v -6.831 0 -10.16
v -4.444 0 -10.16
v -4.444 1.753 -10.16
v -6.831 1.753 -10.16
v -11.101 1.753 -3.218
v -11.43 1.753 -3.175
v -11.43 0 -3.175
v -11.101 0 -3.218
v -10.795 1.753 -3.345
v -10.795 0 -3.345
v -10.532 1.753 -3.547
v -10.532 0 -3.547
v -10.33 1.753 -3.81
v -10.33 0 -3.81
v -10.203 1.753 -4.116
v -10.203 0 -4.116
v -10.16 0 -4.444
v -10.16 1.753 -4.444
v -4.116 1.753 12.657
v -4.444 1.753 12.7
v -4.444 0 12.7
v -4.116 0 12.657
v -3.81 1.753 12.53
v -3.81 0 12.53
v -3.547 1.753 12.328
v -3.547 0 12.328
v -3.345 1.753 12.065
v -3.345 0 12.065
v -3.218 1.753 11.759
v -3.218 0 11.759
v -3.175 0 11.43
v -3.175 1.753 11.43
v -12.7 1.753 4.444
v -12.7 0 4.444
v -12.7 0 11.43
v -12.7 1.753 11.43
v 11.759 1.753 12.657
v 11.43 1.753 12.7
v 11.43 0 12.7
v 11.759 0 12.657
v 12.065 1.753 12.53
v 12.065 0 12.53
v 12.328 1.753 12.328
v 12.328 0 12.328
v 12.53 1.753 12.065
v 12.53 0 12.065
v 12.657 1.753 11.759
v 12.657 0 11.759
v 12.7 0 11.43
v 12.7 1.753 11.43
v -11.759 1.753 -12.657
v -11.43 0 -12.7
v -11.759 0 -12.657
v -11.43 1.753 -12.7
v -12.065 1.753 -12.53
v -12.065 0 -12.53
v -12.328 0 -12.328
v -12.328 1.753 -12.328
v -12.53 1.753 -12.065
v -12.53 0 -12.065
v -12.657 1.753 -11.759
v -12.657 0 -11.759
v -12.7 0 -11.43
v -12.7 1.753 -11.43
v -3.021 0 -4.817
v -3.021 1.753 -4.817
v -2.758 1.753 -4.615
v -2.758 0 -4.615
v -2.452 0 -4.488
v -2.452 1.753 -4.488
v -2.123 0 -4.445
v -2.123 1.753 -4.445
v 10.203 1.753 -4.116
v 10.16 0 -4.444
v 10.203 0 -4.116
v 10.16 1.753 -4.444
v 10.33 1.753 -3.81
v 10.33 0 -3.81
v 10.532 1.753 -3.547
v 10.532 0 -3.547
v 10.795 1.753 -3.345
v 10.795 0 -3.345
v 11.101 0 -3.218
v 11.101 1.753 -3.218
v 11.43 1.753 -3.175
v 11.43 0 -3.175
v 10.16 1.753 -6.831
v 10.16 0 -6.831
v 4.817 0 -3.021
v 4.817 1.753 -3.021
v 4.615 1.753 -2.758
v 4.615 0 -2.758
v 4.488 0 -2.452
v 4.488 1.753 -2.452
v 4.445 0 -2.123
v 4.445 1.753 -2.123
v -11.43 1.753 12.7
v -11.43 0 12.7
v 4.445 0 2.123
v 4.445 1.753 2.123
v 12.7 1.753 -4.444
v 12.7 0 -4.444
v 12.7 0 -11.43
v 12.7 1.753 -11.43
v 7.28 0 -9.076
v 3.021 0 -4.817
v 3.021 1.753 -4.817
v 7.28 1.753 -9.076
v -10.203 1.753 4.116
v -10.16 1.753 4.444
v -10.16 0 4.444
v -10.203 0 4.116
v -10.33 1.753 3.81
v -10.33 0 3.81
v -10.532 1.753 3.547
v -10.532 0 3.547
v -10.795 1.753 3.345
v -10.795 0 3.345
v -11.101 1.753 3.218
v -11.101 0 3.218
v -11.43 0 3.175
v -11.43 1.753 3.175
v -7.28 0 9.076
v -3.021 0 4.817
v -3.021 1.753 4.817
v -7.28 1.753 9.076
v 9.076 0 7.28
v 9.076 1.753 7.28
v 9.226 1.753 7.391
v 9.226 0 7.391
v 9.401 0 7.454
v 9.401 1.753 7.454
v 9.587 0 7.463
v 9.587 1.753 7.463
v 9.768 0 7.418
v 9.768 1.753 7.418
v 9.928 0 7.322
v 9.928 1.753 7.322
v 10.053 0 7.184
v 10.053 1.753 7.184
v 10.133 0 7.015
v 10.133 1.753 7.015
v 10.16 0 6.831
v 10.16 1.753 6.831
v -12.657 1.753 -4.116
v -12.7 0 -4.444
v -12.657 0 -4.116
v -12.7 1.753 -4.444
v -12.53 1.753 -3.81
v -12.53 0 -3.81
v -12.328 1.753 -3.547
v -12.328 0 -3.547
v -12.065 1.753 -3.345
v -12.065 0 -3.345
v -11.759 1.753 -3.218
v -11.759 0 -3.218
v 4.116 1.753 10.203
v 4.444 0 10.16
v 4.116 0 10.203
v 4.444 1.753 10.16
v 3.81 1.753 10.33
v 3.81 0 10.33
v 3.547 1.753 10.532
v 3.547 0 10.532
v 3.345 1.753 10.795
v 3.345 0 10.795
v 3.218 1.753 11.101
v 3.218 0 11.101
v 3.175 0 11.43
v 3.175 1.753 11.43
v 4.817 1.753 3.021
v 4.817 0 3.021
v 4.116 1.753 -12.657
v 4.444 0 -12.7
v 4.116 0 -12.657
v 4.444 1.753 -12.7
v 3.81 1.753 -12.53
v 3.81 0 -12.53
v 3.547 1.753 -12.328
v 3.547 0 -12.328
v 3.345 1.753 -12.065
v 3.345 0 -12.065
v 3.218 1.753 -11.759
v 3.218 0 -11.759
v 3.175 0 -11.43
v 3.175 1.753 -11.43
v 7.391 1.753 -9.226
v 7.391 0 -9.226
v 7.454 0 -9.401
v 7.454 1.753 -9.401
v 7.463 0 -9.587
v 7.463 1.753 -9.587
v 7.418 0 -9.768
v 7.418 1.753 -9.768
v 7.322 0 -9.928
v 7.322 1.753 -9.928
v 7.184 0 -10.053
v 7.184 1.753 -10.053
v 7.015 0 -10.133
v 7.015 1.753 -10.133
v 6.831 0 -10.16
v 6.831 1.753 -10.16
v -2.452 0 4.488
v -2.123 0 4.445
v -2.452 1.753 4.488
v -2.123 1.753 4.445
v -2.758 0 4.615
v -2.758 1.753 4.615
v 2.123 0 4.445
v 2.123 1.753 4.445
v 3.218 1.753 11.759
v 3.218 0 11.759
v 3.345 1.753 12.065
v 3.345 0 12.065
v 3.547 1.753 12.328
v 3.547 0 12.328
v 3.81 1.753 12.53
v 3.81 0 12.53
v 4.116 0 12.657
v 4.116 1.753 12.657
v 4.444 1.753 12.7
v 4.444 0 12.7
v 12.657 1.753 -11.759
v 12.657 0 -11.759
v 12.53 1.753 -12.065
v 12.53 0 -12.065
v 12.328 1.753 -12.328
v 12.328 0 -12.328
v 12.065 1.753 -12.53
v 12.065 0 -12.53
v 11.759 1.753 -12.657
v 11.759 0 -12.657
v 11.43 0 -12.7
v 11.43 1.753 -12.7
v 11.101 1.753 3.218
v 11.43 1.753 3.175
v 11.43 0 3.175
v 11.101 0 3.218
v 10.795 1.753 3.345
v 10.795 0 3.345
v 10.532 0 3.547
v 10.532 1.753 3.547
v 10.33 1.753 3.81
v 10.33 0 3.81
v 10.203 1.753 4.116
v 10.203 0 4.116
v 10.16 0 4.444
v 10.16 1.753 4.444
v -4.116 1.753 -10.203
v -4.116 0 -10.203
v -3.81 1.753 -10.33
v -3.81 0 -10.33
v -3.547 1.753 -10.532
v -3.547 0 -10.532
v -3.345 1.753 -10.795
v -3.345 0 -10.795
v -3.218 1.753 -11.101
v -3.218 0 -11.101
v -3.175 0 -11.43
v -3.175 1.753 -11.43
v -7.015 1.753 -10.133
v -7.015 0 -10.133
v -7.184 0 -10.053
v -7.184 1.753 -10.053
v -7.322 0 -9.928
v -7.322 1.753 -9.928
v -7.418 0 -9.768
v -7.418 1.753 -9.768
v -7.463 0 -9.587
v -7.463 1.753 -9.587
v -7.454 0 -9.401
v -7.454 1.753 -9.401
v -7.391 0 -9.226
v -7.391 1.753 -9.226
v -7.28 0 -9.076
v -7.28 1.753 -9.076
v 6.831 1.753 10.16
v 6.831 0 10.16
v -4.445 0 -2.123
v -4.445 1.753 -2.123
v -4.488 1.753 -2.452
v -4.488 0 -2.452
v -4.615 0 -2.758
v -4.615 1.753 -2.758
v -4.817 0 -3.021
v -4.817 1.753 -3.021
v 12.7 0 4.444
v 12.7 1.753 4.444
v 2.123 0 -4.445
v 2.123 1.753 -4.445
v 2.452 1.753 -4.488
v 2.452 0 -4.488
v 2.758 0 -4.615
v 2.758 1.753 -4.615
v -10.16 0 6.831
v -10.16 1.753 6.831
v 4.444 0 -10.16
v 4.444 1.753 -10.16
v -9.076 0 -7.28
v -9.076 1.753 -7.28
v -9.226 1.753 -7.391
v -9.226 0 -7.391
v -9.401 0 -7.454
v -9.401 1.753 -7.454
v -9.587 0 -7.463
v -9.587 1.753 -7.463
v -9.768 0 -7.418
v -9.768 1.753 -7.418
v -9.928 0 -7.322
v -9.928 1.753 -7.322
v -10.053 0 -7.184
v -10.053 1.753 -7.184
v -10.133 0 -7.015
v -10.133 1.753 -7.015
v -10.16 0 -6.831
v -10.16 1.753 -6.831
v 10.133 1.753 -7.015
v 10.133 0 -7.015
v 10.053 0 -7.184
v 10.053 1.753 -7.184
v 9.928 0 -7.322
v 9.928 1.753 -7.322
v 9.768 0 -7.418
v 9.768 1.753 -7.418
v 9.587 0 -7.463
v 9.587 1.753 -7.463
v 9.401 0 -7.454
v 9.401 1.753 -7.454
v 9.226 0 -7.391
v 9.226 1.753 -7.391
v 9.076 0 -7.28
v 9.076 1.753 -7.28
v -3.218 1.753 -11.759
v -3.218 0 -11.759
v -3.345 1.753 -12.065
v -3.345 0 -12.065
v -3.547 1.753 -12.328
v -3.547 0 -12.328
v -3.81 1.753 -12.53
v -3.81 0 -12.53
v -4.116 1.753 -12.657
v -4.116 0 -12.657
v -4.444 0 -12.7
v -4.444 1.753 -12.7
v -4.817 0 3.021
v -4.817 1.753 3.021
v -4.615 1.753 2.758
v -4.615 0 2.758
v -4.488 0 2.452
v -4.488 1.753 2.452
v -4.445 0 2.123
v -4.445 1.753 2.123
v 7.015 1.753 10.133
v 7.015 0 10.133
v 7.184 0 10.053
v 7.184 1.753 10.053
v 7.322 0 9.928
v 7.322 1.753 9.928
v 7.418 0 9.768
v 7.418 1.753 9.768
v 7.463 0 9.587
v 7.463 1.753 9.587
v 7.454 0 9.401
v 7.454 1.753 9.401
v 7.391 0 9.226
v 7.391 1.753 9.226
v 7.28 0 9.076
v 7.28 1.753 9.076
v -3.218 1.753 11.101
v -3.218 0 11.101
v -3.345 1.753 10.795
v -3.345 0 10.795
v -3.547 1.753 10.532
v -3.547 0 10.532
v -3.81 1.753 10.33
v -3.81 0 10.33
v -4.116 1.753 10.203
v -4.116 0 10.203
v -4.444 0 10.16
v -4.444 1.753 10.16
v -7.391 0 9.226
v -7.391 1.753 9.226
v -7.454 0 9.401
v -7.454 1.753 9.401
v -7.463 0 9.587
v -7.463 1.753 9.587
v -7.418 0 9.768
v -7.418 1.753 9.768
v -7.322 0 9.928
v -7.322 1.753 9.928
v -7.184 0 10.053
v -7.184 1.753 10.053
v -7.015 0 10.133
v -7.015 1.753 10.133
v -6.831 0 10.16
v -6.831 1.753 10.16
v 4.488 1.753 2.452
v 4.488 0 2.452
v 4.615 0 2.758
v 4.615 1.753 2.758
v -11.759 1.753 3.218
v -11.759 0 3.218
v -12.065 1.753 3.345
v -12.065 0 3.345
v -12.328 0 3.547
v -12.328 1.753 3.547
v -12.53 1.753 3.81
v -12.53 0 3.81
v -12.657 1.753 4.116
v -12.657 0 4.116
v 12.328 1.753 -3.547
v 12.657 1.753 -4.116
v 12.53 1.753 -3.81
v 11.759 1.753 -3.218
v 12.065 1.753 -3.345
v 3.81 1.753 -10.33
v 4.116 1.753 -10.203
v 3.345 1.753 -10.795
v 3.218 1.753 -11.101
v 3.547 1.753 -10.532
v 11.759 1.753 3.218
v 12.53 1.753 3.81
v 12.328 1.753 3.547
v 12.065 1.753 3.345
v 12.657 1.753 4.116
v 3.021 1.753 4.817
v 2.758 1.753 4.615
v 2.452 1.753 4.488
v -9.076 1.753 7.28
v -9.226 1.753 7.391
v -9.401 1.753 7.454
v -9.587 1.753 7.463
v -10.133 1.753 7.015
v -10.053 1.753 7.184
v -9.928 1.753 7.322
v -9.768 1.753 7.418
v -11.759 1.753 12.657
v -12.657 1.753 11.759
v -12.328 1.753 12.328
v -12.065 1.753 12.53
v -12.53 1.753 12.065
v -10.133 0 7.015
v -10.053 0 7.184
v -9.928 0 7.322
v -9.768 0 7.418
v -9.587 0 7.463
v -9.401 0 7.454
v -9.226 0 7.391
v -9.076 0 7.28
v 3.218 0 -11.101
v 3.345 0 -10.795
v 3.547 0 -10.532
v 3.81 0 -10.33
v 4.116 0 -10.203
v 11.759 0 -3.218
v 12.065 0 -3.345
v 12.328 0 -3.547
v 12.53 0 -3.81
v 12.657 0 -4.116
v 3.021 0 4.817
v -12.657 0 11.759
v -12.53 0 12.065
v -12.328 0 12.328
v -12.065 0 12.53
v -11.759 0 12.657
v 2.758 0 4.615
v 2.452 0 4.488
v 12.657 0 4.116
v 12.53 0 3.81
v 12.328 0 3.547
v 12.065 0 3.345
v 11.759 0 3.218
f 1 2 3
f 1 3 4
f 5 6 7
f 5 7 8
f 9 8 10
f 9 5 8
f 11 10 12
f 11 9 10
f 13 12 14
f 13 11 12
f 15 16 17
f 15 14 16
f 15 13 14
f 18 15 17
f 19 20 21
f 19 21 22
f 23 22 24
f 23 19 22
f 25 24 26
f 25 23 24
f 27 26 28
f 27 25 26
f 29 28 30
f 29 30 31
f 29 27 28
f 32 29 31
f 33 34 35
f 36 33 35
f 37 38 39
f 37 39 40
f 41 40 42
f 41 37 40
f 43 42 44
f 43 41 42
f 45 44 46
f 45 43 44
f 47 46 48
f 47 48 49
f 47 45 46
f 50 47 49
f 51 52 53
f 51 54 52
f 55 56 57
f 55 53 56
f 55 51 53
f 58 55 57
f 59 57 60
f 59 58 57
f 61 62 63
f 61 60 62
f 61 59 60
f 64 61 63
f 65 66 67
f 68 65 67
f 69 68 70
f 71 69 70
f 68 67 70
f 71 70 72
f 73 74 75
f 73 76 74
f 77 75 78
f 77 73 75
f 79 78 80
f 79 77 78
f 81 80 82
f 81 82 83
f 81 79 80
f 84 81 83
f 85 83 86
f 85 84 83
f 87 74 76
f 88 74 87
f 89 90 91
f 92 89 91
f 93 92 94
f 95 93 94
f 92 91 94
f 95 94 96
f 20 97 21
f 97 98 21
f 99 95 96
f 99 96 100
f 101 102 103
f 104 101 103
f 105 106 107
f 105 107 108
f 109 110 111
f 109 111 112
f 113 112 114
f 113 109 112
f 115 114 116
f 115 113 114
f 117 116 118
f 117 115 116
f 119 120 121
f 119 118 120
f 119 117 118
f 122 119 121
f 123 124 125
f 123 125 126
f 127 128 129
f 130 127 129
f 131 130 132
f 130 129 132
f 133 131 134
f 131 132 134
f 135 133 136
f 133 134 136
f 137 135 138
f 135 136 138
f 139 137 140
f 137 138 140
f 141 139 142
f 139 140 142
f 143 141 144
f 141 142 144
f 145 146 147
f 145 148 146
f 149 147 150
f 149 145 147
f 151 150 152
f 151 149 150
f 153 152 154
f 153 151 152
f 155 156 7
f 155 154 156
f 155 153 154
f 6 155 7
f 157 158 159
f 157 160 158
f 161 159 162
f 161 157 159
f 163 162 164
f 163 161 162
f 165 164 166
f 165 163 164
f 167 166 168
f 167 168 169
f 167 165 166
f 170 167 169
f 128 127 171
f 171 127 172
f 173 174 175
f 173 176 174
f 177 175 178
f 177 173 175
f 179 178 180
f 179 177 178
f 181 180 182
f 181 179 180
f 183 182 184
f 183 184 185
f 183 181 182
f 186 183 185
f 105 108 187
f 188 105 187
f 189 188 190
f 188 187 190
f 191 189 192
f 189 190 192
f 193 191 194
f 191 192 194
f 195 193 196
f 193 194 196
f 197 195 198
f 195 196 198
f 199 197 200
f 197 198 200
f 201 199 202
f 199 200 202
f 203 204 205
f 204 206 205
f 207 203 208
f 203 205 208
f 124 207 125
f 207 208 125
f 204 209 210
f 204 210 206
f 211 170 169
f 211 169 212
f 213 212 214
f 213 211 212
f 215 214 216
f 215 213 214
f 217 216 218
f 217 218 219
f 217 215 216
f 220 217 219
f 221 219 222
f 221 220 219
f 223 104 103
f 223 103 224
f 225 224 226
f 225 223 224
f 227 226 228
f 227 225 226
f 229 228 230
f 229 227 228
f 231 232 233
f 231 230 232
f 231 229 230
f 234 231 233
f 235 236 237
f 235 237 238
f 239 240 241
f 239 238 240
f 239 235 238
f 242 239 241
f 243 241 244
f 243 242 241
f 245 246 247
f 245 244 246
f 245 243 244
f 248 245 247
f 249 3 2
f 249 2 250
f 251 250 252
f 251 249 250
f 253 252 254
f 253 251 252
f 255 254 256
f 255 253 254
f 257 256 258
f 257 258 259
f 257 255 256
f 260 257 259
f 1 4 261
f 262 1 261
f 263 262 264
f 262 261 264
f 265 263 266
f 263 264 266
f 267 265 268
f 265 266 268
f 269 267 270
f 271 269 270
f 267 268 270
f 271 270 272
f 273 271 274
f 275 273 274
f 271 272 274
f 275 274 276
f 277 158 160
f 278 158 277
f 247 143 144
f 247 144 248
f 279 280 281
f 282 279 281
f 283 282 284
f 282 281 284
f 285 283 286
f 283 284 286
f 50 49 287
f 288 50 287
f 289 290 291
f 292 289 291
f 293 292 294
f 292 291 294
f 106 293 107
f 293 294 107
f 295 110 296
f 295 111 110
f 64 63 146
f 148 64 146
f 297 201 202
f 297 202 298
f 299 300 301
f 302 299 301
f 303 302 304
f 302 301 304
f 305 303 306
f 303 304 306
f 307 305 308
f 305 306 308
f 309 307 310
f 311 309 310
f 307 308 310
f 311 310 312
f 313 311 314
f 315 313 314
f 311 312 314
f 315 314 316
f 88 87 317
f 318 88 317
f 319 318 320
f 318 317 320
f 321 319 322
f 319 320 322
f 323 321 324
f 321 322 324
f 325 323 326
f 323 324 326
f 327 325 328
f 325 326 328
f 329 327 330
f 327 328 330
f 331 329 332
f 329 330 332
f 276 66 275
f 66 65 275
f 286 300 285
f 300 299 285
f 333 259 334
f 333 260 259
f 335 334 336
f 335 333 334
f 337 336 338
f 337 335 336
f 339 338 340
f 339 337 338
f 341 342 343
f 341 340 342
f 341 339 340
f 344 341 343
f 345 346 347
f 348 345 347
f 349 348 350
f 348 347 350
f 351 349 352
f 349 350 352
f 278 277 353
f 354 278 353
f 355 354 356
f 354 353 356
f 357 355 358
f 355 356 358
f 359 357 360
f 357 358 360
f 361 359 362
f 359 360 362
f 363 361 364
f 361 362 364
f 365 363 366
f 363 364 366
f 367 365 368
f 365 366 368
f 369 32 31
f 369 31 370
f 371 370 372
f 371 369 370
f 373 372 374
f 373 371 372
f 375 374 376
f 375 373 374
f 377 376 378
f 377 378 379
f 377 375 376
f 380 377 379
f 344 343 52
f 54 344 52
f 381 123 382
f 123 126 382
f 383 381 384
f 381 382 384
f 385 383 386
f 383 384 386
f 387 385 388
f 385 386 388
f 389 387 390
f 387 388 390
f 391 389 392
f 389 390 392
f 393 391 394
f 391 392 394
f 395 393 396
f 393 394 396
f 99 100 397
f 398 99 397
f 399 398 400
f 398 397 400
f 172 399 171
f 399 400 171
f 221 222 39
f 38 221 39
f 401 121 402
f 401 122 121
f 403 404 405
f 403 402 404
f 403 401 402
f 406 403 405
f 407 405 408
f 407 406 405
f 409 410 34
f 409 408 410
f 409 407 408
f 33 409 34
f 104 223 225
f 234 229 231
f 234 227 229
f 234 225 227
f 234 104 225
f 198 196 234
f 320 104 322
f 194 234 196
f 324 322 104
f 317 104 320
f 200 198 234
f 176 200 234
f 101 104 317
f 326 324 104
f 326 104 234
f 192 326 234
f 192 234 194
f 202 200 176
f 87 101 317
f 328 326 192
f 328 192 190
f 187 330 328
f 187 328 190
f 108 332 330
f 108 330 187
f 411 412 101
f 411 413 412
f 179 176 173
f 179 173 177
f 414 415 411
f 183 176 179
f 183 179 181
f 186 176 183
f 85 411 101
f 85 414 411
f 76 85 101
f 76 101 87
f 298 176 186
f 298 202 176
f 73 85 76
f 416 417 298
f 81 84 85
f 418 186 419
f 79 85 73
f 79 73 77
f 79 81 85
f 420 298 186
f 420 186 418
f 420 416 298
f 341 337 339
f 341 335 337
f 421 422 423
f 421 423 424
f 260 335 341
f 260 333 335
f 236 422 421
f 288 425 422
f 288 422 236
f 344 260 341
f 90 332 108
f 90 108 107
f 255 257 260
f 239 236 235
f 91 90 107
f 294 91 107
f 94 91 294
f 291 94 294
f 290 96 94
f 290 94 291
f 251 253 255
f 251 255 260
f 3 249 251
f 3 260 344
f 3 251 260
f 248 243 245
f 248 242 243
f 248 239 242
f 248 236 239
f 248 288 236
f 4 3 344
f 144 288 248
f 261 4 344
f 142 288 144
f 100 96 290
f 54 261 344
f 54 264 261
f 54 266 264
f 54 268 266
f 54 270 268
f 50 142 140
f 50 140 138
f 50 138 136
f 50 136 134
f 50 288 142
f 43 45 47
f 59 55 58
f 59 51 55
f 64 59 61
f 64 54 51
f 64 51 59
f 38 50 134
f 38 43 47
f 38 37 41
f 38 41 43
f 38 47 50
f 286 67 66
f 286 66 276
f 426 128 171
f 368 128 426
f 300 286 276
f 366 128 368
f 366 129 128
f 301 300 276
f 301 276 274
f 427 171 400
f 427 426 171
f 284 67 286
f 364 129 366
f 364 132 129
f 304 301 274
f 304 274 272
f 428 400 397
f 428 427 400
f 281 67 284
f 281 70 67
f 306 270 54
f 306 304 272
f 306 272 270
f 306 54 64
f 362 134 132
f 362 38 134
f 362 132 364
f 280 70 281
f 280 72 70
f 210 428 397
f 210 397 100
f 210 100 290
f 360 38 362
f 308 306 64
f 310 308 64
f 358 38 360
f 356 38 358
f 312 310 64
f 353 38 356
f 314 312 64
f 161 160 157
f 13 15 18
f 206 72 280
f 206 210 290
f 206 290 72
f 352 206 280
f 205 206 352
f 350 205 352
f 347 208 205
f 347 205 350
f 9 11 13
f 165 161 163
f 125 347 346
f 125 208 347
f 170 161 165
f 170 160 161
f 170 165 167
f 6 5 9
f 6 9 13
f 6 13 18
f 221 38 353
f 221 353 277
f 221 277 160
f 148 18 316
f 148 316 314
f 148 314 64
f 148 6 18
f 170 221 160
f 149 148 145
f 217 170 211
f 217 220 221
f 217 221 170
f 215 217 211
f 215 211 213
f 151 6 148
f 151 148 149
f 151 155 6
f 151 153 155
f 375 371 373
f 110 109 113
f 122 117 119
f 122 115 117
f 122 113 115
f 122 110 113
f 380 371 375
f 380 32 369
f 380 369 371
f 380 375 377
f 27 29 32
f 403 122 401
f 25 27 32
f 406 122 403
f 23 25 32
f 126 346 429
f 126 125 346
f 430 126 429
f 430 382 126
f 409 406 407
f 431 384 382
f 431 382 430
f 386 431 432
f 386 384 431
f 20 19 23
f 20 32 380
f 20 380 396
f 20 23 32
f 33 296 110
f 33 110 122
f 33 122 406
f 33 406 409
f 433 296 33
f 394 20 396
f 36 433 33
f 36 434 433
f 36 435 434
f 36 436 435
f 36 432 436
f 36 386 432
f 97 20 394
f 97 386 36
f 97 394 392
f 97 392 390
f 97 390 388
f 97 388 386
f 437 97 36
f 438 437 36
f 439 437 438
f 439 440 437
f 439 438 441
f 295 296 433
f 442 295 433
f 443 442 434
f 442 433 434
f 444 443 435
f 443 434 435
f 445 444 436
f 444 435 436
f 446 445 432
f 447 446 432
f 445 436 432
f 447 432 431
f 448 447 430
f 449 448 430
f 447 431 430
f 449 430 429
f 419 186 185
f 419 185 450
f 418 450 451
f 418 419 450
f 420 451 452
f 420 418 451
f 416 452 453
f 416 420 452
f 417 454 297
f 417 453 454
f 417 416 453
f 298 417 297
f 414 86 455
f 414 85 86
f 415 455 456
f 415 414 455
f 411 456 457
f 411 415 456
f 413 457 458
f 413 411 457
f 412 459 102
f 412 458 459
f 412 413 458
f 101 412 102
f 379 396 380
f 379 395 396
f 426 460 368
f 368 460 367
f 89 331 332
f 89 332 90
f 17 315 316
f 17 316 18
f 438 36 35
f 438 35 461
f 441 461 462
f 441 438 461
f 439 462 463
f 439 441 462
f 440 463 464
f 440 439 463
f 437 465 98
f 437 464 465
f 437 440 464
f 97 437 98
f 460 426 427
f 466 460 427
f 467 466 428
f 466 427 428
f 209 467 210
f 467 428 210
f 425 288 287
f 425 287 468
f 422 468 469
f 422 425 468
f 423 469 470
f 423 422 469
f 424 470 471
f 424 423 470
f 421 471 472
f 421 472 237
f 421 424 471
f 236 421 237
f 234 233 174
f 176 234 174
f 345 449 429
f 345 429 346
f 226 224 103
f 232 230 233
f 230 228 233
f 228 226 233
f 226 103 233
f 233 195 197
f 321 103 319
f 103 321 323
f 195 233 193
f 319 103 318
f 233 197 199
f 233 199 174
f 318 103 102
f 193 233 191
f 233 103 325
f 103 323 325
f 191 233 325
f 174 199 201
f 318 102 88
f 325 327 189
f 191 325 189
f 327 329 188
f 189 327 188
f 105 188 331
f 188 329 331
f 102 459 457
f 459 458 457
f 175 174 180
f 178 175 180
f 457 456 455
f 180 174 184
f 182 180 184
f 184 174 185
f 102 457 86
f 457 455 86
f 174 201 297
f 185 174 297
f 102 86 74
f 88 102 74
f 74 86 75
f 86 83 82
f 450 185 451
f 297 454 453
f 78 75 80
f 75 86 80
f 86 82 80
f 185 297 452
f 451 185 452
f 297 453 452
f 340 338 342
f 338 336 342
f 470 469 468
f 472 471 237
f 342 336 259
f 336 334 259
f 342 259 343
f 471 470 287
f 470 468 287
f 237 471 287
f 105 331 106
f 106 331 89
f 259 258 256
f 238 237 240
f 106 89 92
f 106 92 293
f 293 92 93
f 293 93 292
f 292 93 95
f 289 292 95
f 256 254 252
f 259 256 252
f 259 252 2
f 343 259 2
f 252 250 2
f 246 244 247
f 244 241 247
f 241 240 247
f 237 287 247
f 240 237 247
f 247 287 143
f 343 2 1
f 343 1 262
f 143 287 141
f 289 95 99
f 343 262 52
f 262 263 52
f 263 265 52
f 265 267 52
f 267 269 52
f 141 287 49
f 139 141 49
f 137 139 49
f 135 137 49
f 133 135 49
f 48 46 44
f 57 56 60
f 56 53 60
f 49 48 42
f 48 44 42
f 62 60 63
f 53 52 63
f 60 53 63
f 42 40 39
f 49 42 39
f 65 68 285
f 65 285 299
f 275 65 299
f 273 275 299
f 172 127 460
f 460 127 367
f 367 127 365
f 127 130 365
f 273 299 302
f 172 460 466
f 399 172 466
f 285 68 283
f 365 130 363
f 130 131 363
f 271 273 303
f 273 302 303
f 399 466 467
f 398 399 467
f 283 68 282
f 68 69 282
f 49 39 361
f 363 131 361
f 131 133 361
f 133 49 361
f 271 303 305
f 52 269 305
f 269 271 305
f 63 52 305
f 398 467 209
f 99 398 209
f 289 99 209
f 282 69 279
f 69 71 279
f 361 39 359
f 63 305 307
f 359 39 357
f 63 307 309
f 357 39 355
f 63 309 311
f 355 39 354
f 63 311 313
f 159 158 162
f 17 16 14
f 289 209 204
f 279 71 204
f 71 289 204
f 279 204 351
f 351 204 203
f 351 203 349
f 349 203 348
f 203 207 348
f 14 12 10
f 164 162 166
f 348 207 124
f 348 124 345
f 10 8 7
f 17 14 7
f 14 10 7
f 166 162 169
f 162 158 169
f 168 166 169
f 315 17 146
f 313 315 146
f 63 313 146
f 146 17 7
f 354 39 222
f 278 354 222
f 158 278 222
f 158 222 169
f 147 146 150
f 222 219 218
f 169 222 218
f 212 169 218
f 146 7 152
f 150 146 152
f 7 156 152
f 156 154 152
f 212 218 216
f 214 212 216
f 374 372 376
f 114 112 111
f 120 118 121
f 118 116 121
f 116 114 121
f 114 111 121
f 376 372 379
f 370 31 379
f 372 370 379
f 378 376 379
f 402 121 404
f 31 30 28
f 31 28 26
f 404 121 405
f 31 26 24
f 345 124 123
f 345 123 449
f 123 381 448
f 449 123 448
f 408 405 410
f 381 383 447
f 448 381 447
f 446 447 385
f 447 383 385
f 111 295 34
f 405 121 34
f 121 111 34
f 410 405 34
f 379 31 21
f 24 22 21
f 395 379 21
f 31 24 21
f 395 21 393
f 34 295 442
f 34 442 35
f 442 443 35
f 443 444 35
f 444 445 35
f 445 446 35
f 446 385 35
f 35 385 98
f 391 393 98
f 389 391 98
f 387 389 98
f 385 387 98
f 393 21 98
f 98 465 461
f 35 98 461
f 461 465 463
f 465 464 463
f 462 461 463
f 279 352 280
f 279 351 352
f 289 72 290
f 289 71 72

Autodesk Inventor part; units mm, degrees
ref_plane "YZ Plane" through (0, 0, 0) normal (1, 0, 0) x (0, 1, 0)
ref_plane "XZ Plane" through (0, 0, 0) normal (0, 1, 0) x (-1, 0, 0)
ref_plane "XY Plane" through (0, 0, 0) normal (0, 0, 1) x (1, 0, 0)
sketch "Sketch1" plane through (0, 0, 0) normal (0, 1, 0) x (-1, 0, 0)
  line L0 (12.7, 12.7) -> (-12.7, 12.7)
  line L1 (-12.7, 12.7) -> (-12.7, -12.7)
  line L2 (-12.7, -12.7) -> (12.7, -12.7)
  line L3 (12.7, -12.7) -> (12.7, 12.7)
  line L4 (12.7, 12.7) -> (-12.7, -12.7) construction
  line L5 (-12.7, 12.7) -> (12.7, -12.7) construction
  line L6 (10.16, 10.16) -> (-10.16, 10.16)
  line L7 (-10.16, 10.16) -> (-10.16, -10.16)
  line L8 (-10.16, -10.16) -> (10.16, -10.16)
  line L9 (10.16, -10.16) -> (10.16, 10.16)
  line L10 (10.16, 10.16) -> (-10.16, -10.16) construction
  line L11 (-10.16, 10.16) -> (10.16, -10.16) construction
  line L12 (-4.445, 4.445) -> (4.445, 4.445)
  line L13 (4.445, 4.445) -> (4.445, -4.445)
  line L14 (4.445, -4.445) -> (-4.445, -4.445)
  line L15 (-4.445, -4.445) -> (-4.445, 4.445)
  line L16 (-4.445, 4.445) -> (4.445, -4.445) construction
  line L17 (4.445, 4.445) -> (-4.445, -4.445) construction
  line L18 (0, 12.7) -> (-3.175, 12.7)
  line L19 (-3.175, 12.7) -> (3.175, 12.7)
  line L20 (3.175, 12.7) -> (3.175, -12.7)
  line L21 (3.175, -12.7) -> (-3.175, -12.7)
  line L22 (-3.175, -12.7) -> (-3.175, 12.7)
  line L23 (12.7, 0) -> (12.7, 3.175)
  line L24 (12.7, 3.175) -> (-12.7, 3.175)
  line L25 (-12.7, 3.175) -> (-12.7, -3.175)
  line L26 (-12.7, -3.175) -> (12.7, -3.175)
  line L27 (12.7, -3.175) -> (12.7, 3.175)
  line L28 (-13.598, -11.802) -> (11.802, 13.598)
  line L29 (11.802, 13.598) -> (13.598, 11.802)
  line L30 (13.598, 11.802) -> (-11.802, -13.598)
  line L31 (-11.802, -13.598) -> (-13.598, -11.802)
  line L32 (-13.598, -11.802) -> (13.598, 11.802) construction
  line L33 (11.802, 13.598) -> (-11.802, -13.598) construction
  line L34 (-13.598, 11.802) -> (11.802, -13.598)
  line L35 (11.802, -13.598) -> (13.598, -11.802)
  line L36 (13.598, -11.802) -> (-11.802, 13.598)
  line L37 (-11.802, 13.598) -> (-13.598, 11.802)
  line L38 (-13.598, 11.802) -> (13.598, -11.802) construction
  line L39 (11.802, -13.598) -> (-11.802, 13.598) construction
  point P0 (0, 0)
  point P1 (8.3639, 10.16)
  point P2 (2.6489, 4.445)
  point P3 (-2.6489, 4.445)
  point P4 (-8.3639, 10.16)
  point P5 (-10.16, 3.175)
  point P6 (-10.16, 8.3639)
  point P7 (-4.445, 2.6489)
  point P8 (-4.445, -2.6489)
  point P9 (-10.16, -8.3639)
  point P10 (-10.16, -3.175)
  point P11 (-3.175, -10.16)
  point P12 (-8.3639, -10.16)
  point P13 (-2.6489, -4.445)
  point P14 (2.6489, -4.445)
  point P15 (8.3639, -10.16)
  point P16 (3.175, -10.16)
  point P17 (10.16, -3.175)
  point P18 (10.16, -8.3639)
  point P19 (4.445, -2.6489)
  point P20 (4.445, 2.6489)
  point P21 (10.16, 8.3639)
  point P22 (10.16, 3.175)
  point P23 (-3.175, 10.16)
  point P24 (3.175, 10.16)
  dimension "d0" = 25.4
  dimension "d1" = 25.4
  dimension "d2" = 20.32
  dimension "d3" = 20.32
  dimension "d4" = 8.89
  dimension "d5" = 8.89
  dimension "d6" = 3.175
  dimension "d7" = 6.35
  dimension "d8" = 3.175
  dimension "d9" = 6.35
  dimension "d10" = 2.54
  dimension "d11" = 2.54
extrude "Extrusion1" add sketch "Sketch1" along normal blind 1.7526 contours L0 L28 L6 L20 | L0 L3 L30 L9 L6 L28 | L22 L6 L36 L0 | L6 L9 L30 L24 L13 L12 L20 L28 | L20 L12 L28 | L36 L6 L7 L34 L1 L0 | L3 L24 L9 L30 | L36 L22 L12 L15 L24 L34 L7 L6 | L36 L12 L22 | L20 L24 L28 L12 | L12 L13 L24 L20 | L28 L24 L36 L12 | L22 L24 L15 L12 | L12 L36 L24 L22 | L24 L13 L30 L20 | L20 L30 L36 L28 L24 | L28 L36 L24 | L34 L7 L24 L1 | L30 L13 L24 | L24 L36 L28 L34 L22 | L22 L34 L15 L24 | L30 L13 L36 L20 | L20 L36 L30 | L36 L30 L34 L28 | L3 L36 L9 L26 | L24 L15 L34 | L34 L28 L22 | L22 L28 L15 L34 | L36 L13 L26 L20 | L20 L26 L34 L30 L36 | L34 L30 L26 L22 L28 | L26 L7 L28 L1 | L3 L2 L34 L8 L9 L36 | L9 L8 L34 L20 L14 L13 L26 L36 | L26 L13 L36 | L22 L26 L15 L28 | L26 L13 L14 L20 | L20 L14 L34 L26 | L34 L26 L30 | L28 L7 L8 L30 L2 L1 | L28 L26 L15 L14 L22 L30 L8 L7 | L28 L15 L26 | L26 L30 L14 L22 | L22 L14 L15 L26 | L20 L34 L14 | L34 L14 L30 L26 | L2 L20 L8 L34 | L14 L30 L22 | L30 L8 L22 L2
fillet "Fillet1" radius 1.27 28 edges at (-12.7, 0.8763, -12.7) (12.7, 0.8763, -12.7) (3.175, 0.8763, -12.7) (3.175, 0.8763, -10.16) (-3.175, 0.8763, -12.7) (-12.7, 0.8763, -3.175) (-12.7, 0.8763, 3.175) (-10.16, 0.8763, 3.175) (-12.7, 0.8763, 12.7) (-3.175, 0.8763, 10.16) (3.175, 0.8763, 12.7) (3.175, 0.8763, 10.16) (10.16, 0.8763, 3.175) (12.7, 0.8763, 3.175) (10.16, 0.8763, -3.175) (12.7, 0.8763, -3.175) (12.7, 0.8763, 12.7) (-3.175, 0.8763, -10.16) (-10.16, 0.8763, -3.175) (-4.445, 0.8763, 2.6489) (-4.445, 0.8763, -2.6489) (2.6489, 0.8763, -4.445) (-2.6489, 0.8763, -4.445) (4.445, 0.8763, 2.6489) (4.445, 0.8763, -2.6489) (-2.6489, 0.8763, 4.445) (2.6489, 0.8763, 4.445) (-3.175, 0.8763, 12.7)
fillet "Fillet2" radius 0.635 8 edges at (8.3639, 0.8763, 10.16) (10.16, 0.8763, 8.3639) (-8.3639, 0.8763, 10.16) (-10.16, 0.8763, 8.3639) (-10.16, 0.8763, -8.3639) (-8.3639, 0.8763, -10.16) (8.3639, 0.8763, -10.16) (10.16, 0.8763, -8.3639)
properties part number "T_slot_1in_base" material "Aluminum 6061"
